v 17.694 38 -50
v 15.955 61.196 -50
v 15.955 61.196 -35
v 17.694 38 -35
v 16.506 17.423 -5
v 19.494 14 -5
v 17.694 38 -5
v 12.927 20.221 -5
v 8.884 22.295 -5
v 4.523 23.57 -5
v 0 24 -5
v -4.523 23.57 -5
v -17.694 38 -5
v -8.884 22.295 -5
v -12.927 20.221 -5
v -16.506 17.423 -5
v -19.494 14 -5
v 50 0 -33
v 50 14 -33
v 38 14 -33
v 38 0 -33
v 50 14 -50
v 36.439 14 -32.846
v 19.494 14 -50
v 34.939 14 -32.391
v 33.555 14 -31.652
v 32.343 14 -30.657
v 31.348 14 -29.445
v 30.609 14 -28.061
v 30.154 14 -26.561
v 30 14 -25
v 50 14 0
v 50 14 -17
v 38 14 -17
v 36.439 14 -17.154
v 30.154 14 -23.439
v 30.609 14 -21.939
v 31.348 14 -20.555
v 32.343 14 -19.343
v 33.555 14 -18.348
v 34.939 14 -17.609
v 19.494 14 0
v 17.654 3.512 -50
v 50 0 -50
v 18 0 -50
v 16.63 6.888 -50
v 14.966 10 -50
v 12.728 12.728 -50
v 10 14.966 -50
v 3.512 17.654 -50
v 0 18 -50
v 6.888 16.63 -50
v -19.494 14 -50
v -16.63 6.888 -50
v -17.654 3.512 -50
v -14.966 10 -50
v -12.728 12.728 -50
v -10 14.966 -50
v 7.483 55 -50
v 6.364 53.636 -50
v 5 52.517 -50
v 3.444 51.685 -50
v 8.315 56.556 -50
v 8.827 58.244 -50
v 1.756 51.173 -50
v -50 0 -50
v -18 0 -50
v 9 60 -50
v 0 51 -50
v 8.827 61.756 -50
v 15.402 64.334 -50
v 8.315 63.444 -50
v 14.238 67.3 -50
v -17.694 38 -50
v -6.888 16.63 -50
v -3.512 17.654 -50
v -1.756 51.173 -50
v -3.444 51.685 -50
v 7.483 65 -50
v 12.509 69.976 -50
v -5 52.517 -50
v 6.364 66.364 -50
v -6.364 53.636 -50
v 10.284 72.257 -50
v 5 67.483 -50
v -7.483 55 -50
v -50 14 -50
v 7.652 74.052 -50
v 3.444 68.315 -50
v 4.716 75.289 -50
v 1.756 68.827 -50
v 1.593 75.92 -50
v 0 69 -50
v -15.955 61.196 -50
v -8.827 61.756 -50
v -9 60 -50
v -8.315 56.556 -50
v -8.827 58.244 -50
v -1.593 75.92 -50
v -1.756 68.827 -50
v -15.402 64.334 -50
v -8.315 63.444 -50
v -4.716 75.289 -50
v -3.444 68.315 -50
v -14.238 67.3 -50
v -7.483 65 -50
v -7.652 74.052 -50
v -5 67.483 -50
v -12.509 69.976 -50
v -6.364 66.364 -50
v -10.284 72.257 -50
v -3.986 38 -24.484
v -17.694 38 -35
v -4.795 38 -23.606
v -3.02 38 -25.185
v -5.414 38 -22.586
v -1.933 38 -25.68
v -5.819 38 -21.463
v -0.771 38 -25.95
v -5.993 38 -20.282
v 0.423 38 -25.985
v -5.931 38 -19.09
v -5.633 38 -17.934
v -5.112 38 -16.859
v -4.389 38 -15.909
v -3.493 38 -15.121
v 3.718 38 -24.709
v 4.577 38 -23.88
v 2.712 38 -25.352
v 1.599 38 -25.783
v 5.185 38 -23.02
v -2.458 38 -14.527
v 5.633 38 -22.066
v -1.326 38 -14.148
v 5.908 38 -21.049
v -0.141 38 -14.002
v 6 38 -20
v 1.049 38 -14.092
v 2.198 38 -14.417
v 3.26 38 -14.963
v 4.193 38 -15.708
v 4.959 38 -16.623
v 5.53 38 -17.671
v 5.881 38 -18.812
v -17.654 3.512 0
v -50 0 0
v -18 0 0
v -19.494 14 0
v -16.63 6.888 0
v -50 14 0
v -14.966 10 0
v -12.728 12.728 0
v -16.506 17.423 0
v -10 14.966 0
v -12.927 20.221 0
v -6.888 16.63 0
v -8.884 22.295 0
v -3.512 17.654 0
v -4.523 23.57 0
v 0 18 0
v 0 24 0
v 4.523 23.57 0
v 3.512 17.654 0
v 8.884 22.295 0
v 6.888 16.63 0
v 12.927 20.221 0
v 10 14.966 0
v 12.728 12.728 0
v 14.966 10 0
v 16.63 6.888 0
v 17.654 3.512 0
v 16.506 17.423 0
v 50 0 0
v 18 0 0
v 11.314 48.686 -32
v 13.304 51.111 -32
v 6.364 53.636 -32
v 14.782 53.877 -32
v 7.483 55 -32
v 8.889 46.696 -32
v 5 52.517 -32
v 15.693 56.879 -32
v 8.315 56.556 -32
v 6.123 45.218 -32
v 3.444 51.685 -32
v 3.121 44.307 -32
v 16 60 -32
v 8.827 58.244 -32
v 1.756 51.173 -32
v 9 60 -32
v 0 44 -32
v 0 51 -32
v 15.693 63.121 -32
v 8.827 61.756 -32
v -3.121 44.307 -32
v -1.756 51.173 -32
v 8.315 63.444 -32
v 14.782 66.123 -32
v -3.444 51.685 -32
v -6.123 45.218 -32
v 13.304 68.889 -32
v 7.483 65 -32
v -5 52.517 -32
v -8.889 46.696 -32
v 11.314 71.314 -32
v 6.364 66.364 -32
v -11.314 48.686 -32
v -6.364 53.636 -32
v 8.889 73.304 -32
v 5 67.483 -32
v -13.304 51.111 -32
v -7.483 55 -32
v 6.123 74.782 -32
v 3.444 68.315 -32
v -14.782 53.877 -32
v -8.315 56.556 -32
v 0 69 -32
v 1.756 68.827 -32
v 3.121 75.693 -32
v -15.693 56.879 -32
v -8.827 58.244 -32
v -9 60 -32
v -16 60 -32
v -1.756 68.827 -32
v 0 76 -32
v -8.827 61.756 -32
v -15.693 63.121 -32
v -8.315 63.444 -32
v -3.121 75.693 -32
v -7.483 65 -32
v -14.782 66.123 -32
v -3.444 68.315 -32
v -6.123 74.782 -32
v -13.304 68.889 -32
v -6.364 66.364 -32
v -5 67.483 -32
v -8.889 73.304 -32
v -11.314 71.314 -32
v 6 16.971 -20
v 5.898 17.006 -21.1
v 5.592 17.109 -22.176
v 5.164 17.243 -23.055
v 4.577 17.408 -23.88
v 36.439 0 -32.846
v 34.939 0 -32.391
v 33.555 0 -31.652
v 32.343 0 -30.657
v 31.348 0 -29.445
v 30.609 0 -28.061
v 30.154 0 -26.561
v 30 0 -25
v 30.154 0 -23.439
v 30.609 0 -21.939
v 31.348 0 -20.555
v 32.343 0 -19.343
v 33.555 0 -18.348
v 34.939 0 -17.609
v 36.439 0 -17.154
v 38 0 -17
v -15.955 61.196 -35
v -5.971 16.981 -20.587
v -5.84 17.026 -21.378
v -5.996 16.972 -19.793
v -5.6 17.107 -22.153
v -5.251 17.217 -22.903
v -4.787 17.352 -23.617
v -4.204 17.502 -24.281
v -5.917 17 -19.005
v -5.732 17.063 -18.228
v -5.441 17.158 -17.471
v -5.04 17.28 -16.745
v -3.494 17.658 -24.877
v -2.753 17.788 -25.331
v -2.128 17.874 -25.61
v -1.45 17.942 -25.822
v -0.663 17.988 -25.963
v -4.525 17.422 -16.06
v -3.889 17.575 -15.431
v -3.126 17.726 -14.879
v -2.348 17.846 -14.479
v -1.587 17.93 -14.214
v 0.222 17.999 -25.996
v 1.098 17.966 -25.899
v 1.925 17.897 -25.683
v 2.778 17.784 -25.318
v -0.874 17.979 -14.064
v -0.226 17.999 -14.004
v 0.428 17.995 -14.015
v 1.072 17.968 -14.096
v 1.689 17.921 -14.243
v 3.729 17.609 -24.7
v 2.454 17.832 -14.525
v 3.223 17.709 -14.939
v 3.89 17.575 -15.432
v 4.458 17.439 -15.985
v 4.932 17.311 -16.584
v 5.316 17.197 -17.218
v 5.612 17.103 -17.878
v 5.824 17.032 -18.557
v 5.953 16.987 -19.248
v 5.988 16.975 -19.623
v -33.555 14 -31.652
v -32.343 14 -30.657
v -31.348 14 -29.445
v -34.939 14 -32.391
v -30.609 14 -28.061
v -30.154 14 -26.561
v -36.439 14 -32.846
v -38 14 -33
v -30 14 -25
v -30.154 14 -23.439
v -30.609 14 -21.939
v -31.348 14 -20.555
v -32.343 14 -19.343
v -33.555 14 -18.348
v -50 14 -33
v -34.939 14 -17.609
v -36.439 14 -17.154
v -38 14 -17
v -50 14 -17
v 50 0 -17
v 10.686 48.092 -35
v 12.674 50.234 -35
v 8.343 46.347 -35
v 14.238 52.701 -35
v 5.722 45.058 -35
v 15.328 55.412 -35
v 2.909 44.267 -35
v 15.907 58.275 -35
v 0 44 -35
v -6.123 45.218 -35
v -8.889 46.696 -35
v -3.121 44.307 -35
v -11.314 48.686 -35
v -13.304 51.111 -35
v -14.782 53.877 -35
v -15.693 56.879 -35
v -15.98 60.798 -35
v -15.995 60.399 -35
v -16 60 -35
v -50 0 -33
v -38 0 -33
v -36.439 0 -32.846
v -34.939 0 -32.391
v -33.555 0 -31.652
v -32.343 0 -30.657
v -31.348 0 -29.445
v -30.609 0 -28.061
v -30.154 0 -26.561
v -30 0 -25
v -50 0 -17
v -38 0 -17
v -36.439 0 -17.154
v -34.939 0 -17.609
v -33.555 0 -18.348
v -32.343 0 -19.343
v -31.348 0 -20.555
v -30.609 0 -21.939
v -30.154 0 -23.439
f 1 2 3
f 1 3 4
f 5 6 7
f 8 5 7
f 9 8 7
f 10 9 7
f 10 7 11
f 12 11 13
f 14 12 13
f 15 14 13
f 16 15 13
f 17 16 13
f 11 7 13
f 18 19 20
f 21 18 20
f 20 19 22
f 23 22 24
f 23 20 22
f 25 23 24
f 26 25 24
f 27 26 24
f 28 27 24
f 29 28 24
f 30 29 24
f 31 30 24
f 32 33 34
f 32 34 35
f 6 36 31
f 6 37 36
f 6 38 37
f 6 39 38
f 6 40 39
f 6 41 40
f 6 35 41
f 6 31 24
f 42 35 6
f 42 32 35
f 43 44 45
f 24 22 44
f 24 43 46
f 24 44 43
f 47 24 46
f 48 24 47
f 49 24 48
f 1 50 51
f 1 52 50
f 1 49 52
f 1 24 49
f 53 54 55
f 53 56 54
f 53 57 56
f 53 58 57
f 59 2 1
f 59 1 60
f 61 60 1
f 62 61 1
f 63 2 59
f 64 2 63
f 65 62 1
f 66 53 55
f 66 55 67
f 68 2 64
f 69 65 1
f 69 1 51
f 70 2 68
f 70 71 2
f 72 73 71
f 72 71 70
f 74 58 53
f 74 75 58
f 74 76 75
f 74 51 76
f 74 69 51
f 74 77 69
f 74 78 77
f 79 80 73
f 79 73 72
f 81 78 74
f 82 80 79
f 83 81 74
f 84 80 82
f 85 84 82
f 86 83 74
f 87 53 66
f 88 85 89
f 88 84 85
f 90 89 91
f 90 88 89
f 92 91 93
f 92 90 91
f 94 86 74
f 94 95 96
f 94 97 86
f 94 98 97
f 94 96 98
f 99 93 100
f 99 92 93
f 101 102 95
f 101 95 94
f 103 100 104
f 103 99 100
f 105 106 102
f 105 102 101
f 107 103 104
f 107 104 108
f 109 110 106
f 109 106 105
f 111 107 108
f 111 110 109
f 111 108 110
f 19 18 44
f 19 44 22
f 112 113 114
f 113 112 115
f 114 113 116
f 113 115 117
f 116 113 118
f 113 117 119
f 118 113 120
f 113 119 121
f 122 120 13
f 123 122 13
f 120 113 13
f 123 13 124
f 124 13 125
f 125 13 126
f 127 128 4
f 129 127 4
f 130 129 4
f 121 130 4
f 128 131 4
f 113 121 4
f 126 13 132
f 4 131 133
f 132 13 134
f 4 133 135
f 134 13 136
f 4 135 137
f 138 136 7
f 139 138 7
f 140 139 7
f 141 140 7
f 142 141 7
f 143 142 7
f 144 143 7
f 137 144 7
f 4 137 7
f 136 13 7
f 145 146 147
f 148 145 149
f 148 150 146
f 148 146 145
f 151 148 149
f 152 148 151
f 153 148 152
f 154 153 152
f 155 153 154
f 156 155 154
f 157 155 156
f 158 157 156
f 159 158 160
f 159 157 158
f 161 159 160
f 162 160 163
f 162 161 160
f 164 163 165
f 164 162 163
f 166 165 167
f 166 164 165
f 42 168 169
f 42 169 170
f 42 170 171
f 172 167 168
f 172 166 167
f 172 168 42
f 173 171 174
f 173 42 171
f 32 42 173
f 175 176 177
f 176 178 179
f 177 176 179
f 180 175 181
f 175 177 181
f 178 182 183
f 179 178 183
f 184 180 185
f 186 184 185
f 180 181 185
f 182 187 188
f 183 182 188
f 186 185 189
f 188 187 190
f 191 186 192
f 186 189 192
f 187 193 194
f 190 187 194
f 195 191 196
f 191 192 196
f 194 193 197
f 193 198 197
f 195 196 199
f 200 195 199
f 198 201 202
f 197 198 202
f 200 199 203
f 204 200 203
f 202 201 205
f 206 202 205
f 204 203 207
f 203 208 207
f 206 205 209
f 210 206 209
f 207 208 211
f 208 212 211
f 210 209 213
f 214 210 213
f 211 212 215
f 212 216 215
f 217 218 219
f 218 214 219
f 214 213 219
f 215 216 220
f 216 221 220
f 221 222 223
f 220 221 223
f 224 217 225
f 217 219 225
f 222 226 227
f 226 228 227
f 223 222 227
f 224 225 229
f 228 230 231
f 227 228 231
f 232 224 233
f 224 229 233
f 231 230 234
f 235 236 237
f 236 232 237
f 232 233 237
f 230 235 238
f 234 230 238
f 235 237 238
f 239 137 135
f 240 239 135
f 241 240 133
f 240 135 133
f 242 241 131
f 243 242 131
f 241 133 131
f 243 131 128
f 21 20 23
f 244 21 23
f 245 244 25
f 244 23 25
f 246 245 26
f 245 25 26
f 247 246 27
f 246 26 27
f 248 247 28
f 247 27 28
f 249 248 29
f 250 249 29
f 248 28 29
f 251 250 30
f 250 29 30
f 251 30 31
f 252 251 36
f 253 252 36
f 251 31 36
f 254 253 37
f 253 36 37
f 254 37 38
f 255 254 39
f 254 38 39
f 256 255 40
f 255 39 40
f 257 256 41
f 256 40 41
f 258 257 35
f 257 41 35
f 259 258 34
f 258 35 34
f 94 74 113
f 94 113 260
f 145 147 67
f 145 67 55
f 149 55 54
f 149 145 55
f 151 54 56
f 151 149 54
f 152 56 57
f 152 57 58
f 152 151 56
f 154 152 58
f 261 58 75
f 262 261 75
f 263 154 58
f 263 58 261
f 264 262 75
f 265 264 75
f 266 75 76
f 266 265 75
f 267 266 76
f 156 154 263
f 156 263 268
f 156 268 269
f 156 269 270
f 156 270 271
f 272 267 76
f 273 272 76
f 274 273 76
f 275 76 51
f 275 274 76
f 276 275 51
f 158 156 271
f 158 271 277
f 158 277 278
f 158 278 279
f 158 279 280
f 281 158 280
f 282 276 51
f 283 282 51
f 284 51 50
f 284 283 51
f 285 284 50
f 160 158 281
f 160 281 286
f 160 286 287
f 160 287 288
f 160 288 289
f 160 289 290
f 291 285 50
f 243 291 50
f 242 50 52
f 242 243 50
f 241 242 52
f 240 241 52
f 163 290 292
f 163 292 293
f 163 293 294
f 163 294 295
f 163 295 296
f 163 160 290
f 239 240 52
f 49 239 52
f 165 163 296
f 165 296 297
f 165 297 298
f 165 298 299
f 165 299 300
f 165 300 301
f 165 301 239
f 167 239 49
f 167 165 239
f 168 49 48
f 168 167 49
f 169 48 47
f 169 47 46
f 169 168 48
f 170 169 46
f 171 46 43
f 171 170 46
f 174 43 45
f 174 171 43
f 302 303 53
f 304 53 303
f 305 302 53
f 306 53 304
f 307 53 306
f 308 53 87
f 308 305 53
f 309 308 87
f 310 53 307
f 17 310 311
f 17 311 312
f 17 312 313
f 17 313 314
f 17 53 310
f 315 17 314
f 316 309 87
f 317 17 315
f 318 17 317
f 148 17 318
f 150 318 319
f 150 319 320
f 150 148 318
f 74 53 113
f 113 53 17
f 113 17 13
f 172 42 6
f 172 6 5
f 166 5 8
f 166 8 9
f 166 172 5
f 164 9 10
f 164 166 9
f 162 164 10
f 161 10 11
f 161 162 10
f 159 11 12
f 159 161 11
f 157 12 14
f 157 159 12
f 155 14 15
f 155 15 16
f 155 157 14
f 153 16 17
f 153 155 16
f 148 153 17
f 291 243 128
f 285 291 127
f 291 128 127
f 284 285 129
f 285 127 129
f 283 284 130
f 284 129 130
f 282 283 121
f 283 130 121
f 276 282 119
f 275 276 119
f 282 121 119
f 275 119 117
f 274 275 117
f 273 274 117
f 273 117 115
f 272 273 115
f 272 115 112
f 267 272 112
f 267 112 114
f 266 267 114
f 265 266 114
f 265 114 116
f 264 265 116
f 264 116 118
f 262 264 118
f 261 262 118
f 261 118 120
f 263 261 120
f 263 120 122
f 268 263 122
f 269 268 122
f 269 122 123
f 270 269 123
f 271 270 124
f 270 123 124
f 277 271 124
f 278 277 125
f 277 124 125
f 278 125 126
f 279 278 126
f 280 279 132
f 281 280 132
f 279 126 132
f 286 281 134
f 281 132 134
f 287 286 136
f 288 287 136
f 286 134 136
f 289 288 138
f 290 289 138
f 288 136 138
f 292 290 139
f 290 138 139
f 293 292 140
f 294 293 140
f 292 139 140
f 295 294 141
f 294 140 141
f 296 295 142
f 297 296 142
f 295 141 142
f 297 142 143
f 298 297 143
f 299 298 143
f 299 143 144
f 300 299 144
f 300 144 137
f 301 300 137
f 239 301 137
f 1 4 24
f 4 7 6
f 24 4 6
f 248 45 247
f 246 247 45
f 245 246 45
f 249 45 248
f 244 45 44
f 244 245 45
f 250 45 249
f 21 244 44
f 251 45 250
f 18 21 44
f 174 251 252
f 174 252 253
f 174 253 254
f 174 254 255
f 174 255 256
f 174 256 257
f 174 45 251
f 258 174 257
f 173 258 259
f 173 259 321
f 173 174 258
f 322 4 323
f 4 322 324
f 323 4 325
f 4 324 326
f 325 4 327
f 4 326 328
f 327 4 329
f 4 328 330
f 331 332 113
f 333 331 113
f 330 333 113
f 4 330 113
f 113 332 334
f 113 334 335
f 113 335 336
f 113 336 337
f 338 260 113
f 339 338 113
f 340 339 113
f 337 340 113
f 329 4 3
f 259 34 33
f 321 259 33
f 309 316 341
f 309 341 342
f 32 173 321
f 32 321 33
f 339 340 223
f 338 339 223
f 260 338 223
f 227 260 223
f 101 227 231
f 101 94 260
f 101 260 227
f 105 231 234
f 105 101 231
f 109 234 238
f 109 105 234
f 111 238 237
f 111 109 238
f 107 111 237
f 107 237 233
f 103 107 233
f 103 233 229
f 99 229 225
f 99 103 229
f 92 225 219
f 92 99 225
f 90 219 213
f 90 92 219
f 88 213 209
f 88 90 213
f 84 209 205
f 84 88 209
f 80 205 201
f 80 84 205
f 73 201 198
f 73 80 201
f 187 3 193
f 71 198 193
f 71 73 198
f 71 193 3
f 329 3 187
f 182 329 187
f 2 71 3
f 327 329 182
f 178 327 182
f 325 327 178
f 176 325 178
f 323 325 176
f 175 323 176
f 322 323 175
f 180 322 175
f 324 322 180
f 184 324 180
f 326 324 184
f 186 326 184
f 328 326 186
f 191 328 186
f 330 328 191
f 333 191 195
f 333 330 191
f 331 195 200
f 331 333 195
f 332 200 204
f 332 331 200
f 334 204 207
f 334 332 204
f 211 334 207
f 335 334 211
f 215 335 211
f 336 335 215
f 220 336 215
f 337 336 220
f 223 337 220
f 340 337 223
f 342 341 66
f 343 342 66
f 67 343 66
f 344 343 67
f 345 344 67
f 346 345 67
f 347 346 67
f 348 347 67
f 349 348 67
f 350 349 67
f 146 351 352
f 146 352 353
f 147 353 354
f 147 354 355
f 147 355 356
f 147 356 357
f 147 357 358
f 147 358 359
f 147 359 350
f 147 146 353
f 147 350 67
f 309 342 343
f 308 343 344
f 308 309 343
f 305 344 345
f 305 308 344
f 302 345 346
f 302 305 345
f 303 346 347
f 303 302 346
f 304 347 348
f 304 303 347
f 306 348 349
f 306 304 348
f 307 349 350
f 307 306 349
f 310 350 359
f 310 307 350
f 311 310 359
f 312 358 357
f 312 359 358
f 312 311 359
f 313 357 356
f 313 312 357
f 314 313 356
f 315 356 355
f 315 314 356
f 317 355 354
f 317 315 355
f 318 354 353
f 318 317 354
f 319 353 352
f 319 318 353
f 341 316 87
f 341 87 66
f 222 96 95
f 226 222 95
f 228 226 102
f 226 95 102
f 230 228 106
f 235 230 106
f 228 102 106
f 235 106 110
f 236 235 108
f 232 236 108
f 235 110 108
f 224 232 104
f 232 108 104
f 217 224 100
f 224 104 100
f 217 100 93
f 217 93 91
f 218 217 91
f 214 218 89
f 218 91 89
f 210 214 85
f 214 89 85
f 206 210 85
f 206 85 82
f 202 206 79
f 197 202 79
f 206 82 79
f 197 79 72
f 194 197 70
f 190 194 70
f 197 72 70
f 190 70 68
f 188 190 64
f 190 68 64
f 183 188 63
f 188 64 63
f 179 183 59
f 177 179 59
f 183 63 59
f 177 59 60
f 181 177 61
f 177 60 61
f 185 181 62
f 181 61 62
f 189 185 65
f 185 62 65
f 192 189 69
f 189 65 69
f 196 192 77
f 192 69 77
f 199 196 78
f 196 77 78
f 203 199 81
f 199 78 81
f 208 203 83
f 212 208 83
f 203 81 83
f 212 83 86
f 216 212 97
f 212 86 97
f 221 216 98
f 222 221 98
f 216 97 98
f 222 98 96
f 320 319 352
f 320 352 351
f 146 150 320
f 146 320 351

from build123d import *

# Parameters (mm, degrees)
EXTRUDE_1_DEPTH     = 50
CUT_EXTRUDE_1_DEPTH = 73.083285164
EXTRUDE_START       = -15
EXTRUDE_2_DEPTH     = 15
SKETCH_4_3_R        = 9
EXTRUDE_3_DEPTH     = 18
EXTRUDE_4_DEPTH     = 15
EXTRUDE_START_2     = -45
EXTRUDE_5_DEPTH     = 45
SKETCH_5_R          = 6
CUT_EXTRUDE_2_DEPTH = 81.274528962


with BuildPart() as part:
    # 草图1 → 凸台-拉伸1 (new body)
    with BuildSketch(Plane.XY):
        with BuildLine():
            Line((-50, 0), (-18, 0))
            ThreePointArc((-18, 0), (0, 18), (18, 0))
            Line((18, 0), (50, 0))
            Line((50, 0), (50, 14))
            Line((50, 14), (19.49358869, 14))
            ThreePointArc((19.49358869, 14), (0, 24), (-19.49358869, 14))
            Line((-19.49358869, 14), (-50, 14))
            Line((-50, 14), (-50, 0))
        make_face()
    extrude(amount=-EXTRUDE_1_DEPTH)

    # 草图2 → 切除-拉伸1 (cut, through all)
    with BuildSketch(Plane(origin=(0, 14, 0), x_dir=(1, 0, 0), z_dir=(0, 1, 0))):
        with BuildLine():
            Line((-62, 33), (-38, 33))
            ThreePointArc((-38, 33), (-30, 25), (-38, 17))
            Line((-38, 17), (-62, 17))
            ThreePointArc((-62, 17), (-70, 25), (-62, 33))
        make_face()
        with BuildLine():
            Line((62, 33), (38, 33))
            ThreePointArc((38, 33), (30, 25), (38, 17))
            Line((38, 17), (62, 17))
            ThreePointArc((62, 17), (70, 25), (62, 33))
        make_face()
    extrude(amount=-CUT_EXTRUDE_1_DEPTH, mode=Mode.SUBTRACT)

    # 草图4 → 凸台-拉伸2 (add)
    with BuildSketch(Plane(origin=(0, 0, -50), x_dir=(-1, 0, 0), z_dir=(0, 0, -1)).offset(EXTRUDE_START)):
        with BuildLine():
            Line((-17.69427427, 38), (-19.49358869, 14))
            ThreePointArc((-19.49358869, 14), (0, 24), (19.49358869, 14))
            Line((19.49358869, 14), (17.69427427, 38))
            Line((17.69427427, 38), (-17.69427427, 38))
        make_face()
    extrude(amount=EXTRUDE_2_DEPTH)



with BuildPart() as body_2:
    # 草图4<3> → 凸台-拉伸3 (new body)
    with BuildSketch(Plane(origin=(0, 0, -50), x_dir=(-1, 0, 0), z_dir=(0, 0, -1))):
        with BuildLine():
            ThreePointArc((15.955222944, 61.196185946), (0, 76), (-15.955222944, 61.196185946))
            ThreePointArc((-15.955222944, 61.196185946), (-0.598511863, 44.011198183), (16, 60))
            ThreePointArc((16, 60), (15.988801817, 60.598511863), (15.955222944, 61.196185946))
        make_face()
        with Locations((0, 60)):
            Circle(SKETCH_4_3_R, mode=Mode.SUBTRACT)
    extrude(amount=-EXTRUDE_3_DEPTH)


with BuildPart() as part_1:
    add(part.part)

    add(body_2.part)  # 凸台-拉伸4 merges body 2
    # 草图4<4> → 凸台-拉伸4 (add)
    with BuildSketch(Plane(origin=(0, 0, -50), x_dir=(-1, 0, 0), z_dir=(0, 0, -1))):
        with BuildLine():
            Line((-17.69427427, 38), (17.69427427, 38))
            Line((17.69427427, 38), (15.955222944, 61.196185946))
            ThreePointArc((15.955222944, 61.196185946), (0, 44), (-15.955222944, 61.196185946))
            Line((-15.955222944, 61.196185946), (-17.69427427, 38))
        make_face()
    extrude(amount=-EXTRUDE_4_DEPTH)

    # 草图4<5> → 凸台-拉伸5 (add)
    with BuildSketch(Plane(origin=(0, 0, -50), x_dir=(-1, 0, 0), z_dir=(0, 0, -1)).offset(EXTRUDE_START_2)):
        with BuildLine():
            ThreePointArc((-19.49358869, 14), (0, 24), (19.49358869, 14))
            Line((19.49358869, 14), (17.69427427, 38))
            Line((17.69427427, 38), (-17.69427427, 38))
            Line((-17.69427427, 38), (-19.49358869, 14))
        make_face()
    extrude(amount=EXTRUDE_5_DEPTH)

    # 草图5 → 切除-拉伸2 (cut, through all)
    with BuildSketch(Plane(origin=(0, 38, 0), x_dir=(1, 0, 0), z_dir=(0, 1, 0))):
        with Locations((0, 20)):
            Circle(SKETCH_5_R)
    extrude(amount=-CUT_EXTRUDE_2_DEPTH, mode=Mode.SUBTRACT)


solid = part_1.part
